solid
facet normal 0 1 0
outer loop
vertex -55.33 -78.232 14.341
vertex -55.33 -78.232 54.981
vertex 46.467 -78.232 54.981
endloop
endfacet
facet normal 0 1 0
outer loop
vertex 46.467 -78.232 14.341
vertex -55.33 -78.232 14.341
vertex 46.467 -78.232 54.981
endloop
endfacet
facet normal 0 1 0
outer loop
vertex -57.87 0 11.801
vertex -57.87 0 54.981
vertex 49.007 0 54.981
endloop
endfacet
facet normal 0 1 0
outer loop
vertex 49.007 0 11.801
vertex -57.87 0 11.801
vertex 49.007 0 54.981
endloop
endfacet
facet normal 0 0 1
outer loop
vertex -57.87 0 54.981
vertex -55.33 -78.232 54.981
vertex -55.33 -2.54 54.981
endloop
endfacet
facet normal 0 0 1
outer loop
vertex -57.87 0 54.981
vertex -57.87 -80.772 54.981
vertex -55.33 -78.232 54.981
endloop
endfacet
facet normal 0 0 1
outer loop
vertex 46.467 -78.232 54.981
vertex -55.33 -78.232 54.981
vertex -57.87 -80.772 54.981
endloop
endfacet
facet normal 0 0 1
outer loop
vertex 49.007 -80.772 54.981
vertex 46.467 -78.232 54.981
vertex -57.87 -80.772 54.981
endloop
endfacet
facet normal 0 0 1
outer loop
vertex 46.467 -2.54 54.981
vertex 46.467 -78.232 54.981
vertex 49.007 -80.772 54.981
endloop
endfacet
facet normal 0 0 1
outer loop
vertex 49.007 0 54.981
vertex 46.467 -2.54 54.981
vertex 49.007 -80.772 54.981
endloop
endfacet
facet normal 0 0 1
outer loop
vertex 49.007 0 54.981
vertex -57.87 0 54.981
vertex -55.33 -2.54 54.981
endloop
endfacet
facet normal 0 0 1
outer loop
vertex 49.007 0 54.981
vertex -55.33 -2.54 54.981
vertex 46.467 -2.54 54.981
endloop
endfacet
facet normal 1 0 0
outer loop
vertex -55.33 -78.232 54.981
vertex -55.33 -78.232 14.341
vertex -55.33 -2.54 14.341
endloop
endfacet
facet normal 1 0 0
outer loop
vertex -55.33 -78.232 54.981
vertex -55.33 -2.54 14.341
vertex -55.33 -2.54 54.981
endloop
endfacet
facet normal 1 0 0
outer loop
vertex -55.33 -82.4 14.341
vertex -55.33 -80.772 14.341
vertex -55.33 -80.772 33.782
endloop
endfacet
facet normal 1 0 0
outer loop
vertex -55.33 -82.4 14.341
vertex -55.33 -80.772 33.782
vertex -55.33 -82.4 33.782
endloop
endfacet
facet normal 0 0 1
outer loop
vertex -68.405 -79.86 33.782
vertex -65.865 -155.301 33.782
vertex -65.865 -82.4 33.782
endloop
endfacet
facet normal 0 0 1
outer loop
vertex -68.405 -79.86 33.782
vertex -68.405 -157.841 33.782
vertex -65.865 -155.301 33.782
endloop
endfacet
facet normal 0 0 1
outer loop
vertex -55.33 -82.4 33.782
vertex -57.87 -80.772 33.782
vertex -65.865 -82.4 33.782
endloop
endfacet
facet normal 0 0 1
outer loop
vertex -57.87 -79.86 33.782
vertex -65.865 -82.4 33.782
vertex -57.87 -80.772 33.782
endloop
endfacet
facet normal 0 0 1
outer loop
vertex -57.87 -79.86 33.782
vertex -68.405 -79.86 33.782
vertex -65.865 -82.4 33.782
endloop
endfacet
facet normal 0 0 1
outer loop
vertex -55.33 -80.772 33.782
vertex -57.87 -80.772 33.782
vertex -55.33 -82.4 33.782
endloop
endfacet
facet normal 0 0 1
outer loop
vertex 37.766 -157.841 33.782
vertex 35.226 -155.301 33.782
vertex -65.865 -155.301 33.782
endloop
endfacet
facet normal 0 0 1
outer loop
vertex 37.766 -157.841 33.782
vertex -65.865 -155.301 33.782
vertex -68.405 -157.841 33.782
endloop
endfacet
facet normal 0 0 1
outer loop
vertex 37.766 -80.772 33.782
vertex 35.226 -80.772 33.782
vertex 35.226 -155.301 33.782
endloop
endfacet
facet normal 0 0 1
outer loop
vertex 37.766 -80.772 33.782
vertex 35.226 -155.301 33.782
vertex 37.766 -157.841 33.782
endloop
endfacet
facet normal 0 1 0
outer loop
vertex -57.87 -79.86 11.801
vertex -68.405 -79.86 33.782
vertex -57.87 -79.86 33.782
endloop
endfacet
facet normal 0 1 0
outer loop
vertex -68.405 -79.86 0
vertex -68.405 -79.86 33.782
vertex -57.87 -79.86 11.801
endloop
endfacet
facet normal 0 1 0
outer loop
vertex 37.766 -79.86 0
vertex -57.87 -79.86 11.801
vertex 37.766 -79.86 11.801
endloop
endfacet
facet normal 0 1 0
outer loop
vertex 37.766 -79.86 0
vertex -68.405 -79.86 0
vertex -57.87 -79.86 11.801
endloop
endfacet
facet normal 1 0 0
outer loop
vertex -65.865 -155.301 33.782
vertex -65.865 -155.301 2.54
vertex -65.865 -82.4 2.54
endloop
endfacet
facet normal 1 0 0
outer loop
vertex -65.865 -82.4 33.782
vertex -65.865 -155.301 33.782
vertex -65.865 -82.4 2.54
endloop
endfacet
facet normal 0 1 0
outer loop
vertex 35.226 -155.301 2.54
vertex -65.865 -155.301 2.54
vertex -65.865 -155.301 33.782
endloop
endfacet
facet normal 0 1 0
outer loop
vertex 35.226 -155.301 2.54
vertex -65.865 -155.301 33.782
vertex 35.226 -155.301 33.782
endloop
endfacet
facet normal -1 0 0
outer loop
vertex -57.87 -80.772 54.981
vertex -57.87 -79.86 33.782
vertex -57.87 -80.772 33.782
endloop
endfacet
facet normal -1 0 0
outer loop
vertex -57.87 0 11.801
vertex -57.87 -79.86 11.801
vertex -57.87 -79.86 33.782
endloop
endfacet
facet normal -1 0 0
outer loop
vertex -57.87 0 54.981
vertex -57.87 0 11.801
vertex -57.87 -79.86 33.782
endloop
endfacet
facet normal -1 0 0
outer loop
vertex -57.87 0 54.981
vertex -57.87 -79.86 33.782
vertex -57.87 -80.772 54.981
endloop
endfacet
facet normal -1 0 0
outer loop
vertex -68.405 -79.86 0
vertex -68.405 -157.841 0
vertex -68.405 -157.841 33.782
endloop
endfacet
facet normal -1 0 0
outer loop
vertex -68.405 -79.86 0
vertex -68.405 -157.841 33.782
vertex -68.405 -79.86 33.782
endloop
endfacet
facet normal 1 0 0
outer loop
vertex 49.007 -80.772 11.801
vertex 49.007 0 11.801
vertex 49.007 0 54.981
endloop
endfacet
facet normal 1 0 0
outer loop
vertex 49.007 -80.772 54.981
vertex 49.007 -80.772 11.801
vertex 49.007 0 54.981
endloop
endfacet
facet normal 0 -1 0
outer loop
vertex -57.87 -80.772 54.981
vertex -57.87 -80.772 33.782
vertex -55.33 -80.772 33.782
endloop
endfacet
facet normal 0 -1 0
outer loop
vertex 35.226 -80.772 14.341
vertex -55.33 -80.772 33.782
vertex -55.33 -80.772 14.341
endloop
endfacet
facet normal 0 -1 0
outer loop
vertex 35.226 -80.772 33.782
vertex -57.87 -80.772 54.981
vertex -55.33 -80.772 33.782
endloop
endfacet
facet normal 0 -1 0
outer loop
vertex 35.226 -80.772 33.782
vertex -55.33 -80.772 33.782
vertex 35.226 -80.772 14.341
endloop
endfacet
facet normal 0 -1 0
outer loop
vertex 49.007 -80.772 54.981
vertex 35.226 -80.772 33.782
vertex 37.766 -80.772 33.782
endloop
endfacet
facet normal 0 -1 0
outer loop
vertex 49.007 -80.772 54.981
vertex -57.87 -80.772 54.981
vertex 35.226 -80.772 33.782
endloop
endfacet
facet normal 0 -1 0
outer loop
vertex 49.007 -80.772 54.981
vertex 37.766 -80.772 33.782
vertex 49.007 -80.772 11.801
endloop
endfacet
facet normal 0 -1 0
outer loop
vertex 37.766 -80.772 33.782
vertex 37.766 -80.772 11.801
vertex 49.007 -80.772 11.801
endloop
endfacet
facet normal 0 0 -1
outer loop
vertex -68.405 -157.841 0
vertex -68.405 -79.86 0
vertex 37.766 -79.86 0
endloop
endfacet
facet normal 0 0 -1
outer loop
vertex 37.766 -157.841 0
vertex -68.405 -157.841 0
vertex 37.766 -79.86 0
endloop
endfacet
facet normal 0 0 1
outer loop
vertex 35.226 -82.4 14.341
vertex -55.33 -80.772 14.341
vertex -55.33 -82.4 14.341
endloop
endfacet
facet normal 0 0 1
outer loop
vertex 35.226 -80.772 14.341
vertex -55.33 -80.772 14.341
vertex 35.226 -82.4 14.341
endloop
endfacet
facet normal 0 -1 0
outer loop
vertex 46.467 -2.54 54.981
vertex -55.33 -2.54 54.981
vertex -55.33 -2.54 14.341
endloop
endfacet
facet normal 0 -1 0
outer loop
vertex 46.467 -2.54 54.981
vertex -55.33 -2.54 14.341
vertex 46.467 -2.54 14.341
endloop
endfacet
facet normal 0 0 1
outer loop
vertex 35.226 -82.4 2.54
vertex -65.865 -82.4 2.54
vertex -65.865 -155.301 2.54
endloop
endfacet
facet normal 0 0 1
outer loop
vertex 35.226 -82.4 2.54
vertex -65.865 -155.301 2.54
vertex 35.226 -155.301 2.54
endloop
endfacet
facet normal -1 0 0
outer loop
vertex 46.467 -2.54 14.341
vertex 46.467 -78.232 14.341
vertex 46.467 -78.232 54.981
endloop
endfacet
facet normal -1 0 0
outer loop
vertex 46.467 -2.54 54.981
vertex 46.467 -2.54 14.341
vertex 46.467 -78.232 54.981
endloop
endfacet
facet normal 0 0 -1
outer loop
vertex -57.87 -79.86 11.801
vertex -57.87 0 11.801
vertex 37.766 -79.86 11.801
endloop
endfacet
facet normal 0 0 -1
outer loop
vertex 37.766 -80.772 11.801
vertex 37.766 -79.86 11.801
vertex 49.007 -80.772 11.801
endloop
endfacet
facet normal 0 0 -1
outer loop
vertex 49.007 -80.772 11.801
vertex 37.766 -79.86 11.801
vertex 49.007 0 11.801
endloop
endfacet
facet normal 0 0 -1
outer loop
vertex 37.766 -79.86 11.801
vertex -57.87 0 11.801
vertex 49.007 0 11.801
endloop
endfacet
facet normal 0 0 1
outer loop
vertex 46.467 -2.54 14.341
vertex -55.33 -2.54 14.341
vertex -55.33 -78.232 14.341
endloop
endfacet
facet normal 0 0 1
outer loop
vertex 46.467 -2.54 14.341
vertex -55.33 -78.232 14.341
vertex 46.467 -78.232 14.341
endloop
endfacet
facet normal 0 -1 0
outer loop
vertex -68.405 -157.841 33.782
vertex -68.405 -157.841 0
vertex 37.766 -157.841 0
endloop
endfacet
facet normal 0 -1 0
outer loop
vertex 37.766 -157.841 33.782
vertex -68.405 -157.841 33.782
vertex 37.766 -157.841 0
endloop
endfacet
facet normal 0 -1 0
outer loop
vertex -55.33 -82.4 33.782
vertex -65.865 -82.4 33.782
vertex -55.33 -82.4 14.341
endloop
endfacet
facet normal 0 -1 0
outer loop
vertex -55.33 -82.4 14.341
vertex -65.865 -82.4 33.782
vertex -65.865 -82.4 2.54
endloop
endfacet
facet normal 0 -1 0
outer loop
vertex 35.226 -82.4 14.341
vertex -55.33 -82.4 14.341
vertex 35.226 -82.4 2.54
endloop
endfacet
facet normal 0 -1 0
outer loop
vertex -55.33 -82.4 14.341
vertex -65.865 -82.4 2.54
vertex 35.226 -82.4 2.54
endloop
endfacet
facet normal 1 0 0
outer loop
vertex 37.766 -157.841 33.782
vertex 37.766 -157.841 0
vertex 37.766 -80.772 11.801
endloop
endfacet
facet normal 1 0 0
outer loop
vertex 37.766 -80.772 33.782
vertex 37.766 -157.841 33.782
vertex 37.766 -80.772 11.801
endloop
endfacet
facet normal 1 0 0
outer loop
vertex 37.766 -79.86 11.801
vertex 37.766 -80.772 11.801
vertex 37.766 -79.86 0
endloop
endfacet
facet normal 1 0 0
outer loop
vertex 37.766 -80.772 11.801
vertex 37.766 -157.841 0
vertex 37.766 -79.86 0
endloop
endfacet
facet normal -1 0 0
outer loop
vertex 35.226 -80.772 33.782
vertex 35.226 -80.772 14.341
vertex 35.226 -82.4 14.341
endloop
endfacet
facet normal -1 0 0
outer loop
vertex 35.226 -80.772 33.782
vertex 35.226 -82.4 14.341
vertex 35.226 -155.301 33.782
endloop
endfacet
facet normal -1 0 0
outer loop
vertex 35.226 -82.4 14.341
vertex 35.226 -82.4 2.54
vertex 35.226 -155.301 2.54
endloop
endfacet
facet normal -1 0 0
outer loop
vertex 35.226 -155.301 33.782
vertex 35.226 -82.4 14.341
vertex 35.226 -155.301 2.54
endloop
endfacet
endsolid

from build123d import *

# Parameters (mm, degrees)
F0_W     = 106.8777292967
F0_H     = 43.1794375181
F1_DEPTH = 80.772
F2_T     = -2.54
F3_W     = 106.1705686152
F3_H     = 77.9809653759
F4_DEPTH = 33.782
F5_T     = -2.54


# Not quite as in the source:
# - a shell that OpenCascade refuses in one call is made with other operations: the cavity is built on its own and cut out


with BuildPart() as f1:
    # F0 (on Front) → F1 (new body)
    with BuildSketch(Plane.XZ):
        with Locations((-4.4315196574, 33.3908237517)):
            Rectangle(F0_W, F0_H)
    extrude(amount=F1_DEPTH)

    # F2
    f2_openings = [f1.faces().sort_by_distance(p)[0] for p in [
        (-4.43152, -40.386, 54.980543),
    ]]
    offset(amount=F2_T, openings=f2_openings)

    # F3 (on Top) → F4 (join)
    with BuildSketch(Plane.XY):
        with Locations((-15.3196584433, -118.8506782055)):
            Rectangle(F3_W, F3_H)
    extrude(amount=F4_DEPTH)

    # F5: a shell. OpenCascade refuses it in one call, so the cavity is built on its own and cut out:
    # the body offset inwards by the wall thickness, plus a prism from it out through each open face.
    f5_core = offset(f1.part, amount=F5_T, kind=Kind.INTERSECTION, mode=Mode.PRIVATE)
    f5_exits = [f5_core.faces().sort_by_distance(p)[0] for p in [
        (-15.216343, -118.119753, 31.242),
    ]]
    add(f5_core, mode=Mode.SUBTRACT)
    extrude(f5_exits, amount=-F5_T, mode=Mode.SUBTRACT)


solid = f1.part
